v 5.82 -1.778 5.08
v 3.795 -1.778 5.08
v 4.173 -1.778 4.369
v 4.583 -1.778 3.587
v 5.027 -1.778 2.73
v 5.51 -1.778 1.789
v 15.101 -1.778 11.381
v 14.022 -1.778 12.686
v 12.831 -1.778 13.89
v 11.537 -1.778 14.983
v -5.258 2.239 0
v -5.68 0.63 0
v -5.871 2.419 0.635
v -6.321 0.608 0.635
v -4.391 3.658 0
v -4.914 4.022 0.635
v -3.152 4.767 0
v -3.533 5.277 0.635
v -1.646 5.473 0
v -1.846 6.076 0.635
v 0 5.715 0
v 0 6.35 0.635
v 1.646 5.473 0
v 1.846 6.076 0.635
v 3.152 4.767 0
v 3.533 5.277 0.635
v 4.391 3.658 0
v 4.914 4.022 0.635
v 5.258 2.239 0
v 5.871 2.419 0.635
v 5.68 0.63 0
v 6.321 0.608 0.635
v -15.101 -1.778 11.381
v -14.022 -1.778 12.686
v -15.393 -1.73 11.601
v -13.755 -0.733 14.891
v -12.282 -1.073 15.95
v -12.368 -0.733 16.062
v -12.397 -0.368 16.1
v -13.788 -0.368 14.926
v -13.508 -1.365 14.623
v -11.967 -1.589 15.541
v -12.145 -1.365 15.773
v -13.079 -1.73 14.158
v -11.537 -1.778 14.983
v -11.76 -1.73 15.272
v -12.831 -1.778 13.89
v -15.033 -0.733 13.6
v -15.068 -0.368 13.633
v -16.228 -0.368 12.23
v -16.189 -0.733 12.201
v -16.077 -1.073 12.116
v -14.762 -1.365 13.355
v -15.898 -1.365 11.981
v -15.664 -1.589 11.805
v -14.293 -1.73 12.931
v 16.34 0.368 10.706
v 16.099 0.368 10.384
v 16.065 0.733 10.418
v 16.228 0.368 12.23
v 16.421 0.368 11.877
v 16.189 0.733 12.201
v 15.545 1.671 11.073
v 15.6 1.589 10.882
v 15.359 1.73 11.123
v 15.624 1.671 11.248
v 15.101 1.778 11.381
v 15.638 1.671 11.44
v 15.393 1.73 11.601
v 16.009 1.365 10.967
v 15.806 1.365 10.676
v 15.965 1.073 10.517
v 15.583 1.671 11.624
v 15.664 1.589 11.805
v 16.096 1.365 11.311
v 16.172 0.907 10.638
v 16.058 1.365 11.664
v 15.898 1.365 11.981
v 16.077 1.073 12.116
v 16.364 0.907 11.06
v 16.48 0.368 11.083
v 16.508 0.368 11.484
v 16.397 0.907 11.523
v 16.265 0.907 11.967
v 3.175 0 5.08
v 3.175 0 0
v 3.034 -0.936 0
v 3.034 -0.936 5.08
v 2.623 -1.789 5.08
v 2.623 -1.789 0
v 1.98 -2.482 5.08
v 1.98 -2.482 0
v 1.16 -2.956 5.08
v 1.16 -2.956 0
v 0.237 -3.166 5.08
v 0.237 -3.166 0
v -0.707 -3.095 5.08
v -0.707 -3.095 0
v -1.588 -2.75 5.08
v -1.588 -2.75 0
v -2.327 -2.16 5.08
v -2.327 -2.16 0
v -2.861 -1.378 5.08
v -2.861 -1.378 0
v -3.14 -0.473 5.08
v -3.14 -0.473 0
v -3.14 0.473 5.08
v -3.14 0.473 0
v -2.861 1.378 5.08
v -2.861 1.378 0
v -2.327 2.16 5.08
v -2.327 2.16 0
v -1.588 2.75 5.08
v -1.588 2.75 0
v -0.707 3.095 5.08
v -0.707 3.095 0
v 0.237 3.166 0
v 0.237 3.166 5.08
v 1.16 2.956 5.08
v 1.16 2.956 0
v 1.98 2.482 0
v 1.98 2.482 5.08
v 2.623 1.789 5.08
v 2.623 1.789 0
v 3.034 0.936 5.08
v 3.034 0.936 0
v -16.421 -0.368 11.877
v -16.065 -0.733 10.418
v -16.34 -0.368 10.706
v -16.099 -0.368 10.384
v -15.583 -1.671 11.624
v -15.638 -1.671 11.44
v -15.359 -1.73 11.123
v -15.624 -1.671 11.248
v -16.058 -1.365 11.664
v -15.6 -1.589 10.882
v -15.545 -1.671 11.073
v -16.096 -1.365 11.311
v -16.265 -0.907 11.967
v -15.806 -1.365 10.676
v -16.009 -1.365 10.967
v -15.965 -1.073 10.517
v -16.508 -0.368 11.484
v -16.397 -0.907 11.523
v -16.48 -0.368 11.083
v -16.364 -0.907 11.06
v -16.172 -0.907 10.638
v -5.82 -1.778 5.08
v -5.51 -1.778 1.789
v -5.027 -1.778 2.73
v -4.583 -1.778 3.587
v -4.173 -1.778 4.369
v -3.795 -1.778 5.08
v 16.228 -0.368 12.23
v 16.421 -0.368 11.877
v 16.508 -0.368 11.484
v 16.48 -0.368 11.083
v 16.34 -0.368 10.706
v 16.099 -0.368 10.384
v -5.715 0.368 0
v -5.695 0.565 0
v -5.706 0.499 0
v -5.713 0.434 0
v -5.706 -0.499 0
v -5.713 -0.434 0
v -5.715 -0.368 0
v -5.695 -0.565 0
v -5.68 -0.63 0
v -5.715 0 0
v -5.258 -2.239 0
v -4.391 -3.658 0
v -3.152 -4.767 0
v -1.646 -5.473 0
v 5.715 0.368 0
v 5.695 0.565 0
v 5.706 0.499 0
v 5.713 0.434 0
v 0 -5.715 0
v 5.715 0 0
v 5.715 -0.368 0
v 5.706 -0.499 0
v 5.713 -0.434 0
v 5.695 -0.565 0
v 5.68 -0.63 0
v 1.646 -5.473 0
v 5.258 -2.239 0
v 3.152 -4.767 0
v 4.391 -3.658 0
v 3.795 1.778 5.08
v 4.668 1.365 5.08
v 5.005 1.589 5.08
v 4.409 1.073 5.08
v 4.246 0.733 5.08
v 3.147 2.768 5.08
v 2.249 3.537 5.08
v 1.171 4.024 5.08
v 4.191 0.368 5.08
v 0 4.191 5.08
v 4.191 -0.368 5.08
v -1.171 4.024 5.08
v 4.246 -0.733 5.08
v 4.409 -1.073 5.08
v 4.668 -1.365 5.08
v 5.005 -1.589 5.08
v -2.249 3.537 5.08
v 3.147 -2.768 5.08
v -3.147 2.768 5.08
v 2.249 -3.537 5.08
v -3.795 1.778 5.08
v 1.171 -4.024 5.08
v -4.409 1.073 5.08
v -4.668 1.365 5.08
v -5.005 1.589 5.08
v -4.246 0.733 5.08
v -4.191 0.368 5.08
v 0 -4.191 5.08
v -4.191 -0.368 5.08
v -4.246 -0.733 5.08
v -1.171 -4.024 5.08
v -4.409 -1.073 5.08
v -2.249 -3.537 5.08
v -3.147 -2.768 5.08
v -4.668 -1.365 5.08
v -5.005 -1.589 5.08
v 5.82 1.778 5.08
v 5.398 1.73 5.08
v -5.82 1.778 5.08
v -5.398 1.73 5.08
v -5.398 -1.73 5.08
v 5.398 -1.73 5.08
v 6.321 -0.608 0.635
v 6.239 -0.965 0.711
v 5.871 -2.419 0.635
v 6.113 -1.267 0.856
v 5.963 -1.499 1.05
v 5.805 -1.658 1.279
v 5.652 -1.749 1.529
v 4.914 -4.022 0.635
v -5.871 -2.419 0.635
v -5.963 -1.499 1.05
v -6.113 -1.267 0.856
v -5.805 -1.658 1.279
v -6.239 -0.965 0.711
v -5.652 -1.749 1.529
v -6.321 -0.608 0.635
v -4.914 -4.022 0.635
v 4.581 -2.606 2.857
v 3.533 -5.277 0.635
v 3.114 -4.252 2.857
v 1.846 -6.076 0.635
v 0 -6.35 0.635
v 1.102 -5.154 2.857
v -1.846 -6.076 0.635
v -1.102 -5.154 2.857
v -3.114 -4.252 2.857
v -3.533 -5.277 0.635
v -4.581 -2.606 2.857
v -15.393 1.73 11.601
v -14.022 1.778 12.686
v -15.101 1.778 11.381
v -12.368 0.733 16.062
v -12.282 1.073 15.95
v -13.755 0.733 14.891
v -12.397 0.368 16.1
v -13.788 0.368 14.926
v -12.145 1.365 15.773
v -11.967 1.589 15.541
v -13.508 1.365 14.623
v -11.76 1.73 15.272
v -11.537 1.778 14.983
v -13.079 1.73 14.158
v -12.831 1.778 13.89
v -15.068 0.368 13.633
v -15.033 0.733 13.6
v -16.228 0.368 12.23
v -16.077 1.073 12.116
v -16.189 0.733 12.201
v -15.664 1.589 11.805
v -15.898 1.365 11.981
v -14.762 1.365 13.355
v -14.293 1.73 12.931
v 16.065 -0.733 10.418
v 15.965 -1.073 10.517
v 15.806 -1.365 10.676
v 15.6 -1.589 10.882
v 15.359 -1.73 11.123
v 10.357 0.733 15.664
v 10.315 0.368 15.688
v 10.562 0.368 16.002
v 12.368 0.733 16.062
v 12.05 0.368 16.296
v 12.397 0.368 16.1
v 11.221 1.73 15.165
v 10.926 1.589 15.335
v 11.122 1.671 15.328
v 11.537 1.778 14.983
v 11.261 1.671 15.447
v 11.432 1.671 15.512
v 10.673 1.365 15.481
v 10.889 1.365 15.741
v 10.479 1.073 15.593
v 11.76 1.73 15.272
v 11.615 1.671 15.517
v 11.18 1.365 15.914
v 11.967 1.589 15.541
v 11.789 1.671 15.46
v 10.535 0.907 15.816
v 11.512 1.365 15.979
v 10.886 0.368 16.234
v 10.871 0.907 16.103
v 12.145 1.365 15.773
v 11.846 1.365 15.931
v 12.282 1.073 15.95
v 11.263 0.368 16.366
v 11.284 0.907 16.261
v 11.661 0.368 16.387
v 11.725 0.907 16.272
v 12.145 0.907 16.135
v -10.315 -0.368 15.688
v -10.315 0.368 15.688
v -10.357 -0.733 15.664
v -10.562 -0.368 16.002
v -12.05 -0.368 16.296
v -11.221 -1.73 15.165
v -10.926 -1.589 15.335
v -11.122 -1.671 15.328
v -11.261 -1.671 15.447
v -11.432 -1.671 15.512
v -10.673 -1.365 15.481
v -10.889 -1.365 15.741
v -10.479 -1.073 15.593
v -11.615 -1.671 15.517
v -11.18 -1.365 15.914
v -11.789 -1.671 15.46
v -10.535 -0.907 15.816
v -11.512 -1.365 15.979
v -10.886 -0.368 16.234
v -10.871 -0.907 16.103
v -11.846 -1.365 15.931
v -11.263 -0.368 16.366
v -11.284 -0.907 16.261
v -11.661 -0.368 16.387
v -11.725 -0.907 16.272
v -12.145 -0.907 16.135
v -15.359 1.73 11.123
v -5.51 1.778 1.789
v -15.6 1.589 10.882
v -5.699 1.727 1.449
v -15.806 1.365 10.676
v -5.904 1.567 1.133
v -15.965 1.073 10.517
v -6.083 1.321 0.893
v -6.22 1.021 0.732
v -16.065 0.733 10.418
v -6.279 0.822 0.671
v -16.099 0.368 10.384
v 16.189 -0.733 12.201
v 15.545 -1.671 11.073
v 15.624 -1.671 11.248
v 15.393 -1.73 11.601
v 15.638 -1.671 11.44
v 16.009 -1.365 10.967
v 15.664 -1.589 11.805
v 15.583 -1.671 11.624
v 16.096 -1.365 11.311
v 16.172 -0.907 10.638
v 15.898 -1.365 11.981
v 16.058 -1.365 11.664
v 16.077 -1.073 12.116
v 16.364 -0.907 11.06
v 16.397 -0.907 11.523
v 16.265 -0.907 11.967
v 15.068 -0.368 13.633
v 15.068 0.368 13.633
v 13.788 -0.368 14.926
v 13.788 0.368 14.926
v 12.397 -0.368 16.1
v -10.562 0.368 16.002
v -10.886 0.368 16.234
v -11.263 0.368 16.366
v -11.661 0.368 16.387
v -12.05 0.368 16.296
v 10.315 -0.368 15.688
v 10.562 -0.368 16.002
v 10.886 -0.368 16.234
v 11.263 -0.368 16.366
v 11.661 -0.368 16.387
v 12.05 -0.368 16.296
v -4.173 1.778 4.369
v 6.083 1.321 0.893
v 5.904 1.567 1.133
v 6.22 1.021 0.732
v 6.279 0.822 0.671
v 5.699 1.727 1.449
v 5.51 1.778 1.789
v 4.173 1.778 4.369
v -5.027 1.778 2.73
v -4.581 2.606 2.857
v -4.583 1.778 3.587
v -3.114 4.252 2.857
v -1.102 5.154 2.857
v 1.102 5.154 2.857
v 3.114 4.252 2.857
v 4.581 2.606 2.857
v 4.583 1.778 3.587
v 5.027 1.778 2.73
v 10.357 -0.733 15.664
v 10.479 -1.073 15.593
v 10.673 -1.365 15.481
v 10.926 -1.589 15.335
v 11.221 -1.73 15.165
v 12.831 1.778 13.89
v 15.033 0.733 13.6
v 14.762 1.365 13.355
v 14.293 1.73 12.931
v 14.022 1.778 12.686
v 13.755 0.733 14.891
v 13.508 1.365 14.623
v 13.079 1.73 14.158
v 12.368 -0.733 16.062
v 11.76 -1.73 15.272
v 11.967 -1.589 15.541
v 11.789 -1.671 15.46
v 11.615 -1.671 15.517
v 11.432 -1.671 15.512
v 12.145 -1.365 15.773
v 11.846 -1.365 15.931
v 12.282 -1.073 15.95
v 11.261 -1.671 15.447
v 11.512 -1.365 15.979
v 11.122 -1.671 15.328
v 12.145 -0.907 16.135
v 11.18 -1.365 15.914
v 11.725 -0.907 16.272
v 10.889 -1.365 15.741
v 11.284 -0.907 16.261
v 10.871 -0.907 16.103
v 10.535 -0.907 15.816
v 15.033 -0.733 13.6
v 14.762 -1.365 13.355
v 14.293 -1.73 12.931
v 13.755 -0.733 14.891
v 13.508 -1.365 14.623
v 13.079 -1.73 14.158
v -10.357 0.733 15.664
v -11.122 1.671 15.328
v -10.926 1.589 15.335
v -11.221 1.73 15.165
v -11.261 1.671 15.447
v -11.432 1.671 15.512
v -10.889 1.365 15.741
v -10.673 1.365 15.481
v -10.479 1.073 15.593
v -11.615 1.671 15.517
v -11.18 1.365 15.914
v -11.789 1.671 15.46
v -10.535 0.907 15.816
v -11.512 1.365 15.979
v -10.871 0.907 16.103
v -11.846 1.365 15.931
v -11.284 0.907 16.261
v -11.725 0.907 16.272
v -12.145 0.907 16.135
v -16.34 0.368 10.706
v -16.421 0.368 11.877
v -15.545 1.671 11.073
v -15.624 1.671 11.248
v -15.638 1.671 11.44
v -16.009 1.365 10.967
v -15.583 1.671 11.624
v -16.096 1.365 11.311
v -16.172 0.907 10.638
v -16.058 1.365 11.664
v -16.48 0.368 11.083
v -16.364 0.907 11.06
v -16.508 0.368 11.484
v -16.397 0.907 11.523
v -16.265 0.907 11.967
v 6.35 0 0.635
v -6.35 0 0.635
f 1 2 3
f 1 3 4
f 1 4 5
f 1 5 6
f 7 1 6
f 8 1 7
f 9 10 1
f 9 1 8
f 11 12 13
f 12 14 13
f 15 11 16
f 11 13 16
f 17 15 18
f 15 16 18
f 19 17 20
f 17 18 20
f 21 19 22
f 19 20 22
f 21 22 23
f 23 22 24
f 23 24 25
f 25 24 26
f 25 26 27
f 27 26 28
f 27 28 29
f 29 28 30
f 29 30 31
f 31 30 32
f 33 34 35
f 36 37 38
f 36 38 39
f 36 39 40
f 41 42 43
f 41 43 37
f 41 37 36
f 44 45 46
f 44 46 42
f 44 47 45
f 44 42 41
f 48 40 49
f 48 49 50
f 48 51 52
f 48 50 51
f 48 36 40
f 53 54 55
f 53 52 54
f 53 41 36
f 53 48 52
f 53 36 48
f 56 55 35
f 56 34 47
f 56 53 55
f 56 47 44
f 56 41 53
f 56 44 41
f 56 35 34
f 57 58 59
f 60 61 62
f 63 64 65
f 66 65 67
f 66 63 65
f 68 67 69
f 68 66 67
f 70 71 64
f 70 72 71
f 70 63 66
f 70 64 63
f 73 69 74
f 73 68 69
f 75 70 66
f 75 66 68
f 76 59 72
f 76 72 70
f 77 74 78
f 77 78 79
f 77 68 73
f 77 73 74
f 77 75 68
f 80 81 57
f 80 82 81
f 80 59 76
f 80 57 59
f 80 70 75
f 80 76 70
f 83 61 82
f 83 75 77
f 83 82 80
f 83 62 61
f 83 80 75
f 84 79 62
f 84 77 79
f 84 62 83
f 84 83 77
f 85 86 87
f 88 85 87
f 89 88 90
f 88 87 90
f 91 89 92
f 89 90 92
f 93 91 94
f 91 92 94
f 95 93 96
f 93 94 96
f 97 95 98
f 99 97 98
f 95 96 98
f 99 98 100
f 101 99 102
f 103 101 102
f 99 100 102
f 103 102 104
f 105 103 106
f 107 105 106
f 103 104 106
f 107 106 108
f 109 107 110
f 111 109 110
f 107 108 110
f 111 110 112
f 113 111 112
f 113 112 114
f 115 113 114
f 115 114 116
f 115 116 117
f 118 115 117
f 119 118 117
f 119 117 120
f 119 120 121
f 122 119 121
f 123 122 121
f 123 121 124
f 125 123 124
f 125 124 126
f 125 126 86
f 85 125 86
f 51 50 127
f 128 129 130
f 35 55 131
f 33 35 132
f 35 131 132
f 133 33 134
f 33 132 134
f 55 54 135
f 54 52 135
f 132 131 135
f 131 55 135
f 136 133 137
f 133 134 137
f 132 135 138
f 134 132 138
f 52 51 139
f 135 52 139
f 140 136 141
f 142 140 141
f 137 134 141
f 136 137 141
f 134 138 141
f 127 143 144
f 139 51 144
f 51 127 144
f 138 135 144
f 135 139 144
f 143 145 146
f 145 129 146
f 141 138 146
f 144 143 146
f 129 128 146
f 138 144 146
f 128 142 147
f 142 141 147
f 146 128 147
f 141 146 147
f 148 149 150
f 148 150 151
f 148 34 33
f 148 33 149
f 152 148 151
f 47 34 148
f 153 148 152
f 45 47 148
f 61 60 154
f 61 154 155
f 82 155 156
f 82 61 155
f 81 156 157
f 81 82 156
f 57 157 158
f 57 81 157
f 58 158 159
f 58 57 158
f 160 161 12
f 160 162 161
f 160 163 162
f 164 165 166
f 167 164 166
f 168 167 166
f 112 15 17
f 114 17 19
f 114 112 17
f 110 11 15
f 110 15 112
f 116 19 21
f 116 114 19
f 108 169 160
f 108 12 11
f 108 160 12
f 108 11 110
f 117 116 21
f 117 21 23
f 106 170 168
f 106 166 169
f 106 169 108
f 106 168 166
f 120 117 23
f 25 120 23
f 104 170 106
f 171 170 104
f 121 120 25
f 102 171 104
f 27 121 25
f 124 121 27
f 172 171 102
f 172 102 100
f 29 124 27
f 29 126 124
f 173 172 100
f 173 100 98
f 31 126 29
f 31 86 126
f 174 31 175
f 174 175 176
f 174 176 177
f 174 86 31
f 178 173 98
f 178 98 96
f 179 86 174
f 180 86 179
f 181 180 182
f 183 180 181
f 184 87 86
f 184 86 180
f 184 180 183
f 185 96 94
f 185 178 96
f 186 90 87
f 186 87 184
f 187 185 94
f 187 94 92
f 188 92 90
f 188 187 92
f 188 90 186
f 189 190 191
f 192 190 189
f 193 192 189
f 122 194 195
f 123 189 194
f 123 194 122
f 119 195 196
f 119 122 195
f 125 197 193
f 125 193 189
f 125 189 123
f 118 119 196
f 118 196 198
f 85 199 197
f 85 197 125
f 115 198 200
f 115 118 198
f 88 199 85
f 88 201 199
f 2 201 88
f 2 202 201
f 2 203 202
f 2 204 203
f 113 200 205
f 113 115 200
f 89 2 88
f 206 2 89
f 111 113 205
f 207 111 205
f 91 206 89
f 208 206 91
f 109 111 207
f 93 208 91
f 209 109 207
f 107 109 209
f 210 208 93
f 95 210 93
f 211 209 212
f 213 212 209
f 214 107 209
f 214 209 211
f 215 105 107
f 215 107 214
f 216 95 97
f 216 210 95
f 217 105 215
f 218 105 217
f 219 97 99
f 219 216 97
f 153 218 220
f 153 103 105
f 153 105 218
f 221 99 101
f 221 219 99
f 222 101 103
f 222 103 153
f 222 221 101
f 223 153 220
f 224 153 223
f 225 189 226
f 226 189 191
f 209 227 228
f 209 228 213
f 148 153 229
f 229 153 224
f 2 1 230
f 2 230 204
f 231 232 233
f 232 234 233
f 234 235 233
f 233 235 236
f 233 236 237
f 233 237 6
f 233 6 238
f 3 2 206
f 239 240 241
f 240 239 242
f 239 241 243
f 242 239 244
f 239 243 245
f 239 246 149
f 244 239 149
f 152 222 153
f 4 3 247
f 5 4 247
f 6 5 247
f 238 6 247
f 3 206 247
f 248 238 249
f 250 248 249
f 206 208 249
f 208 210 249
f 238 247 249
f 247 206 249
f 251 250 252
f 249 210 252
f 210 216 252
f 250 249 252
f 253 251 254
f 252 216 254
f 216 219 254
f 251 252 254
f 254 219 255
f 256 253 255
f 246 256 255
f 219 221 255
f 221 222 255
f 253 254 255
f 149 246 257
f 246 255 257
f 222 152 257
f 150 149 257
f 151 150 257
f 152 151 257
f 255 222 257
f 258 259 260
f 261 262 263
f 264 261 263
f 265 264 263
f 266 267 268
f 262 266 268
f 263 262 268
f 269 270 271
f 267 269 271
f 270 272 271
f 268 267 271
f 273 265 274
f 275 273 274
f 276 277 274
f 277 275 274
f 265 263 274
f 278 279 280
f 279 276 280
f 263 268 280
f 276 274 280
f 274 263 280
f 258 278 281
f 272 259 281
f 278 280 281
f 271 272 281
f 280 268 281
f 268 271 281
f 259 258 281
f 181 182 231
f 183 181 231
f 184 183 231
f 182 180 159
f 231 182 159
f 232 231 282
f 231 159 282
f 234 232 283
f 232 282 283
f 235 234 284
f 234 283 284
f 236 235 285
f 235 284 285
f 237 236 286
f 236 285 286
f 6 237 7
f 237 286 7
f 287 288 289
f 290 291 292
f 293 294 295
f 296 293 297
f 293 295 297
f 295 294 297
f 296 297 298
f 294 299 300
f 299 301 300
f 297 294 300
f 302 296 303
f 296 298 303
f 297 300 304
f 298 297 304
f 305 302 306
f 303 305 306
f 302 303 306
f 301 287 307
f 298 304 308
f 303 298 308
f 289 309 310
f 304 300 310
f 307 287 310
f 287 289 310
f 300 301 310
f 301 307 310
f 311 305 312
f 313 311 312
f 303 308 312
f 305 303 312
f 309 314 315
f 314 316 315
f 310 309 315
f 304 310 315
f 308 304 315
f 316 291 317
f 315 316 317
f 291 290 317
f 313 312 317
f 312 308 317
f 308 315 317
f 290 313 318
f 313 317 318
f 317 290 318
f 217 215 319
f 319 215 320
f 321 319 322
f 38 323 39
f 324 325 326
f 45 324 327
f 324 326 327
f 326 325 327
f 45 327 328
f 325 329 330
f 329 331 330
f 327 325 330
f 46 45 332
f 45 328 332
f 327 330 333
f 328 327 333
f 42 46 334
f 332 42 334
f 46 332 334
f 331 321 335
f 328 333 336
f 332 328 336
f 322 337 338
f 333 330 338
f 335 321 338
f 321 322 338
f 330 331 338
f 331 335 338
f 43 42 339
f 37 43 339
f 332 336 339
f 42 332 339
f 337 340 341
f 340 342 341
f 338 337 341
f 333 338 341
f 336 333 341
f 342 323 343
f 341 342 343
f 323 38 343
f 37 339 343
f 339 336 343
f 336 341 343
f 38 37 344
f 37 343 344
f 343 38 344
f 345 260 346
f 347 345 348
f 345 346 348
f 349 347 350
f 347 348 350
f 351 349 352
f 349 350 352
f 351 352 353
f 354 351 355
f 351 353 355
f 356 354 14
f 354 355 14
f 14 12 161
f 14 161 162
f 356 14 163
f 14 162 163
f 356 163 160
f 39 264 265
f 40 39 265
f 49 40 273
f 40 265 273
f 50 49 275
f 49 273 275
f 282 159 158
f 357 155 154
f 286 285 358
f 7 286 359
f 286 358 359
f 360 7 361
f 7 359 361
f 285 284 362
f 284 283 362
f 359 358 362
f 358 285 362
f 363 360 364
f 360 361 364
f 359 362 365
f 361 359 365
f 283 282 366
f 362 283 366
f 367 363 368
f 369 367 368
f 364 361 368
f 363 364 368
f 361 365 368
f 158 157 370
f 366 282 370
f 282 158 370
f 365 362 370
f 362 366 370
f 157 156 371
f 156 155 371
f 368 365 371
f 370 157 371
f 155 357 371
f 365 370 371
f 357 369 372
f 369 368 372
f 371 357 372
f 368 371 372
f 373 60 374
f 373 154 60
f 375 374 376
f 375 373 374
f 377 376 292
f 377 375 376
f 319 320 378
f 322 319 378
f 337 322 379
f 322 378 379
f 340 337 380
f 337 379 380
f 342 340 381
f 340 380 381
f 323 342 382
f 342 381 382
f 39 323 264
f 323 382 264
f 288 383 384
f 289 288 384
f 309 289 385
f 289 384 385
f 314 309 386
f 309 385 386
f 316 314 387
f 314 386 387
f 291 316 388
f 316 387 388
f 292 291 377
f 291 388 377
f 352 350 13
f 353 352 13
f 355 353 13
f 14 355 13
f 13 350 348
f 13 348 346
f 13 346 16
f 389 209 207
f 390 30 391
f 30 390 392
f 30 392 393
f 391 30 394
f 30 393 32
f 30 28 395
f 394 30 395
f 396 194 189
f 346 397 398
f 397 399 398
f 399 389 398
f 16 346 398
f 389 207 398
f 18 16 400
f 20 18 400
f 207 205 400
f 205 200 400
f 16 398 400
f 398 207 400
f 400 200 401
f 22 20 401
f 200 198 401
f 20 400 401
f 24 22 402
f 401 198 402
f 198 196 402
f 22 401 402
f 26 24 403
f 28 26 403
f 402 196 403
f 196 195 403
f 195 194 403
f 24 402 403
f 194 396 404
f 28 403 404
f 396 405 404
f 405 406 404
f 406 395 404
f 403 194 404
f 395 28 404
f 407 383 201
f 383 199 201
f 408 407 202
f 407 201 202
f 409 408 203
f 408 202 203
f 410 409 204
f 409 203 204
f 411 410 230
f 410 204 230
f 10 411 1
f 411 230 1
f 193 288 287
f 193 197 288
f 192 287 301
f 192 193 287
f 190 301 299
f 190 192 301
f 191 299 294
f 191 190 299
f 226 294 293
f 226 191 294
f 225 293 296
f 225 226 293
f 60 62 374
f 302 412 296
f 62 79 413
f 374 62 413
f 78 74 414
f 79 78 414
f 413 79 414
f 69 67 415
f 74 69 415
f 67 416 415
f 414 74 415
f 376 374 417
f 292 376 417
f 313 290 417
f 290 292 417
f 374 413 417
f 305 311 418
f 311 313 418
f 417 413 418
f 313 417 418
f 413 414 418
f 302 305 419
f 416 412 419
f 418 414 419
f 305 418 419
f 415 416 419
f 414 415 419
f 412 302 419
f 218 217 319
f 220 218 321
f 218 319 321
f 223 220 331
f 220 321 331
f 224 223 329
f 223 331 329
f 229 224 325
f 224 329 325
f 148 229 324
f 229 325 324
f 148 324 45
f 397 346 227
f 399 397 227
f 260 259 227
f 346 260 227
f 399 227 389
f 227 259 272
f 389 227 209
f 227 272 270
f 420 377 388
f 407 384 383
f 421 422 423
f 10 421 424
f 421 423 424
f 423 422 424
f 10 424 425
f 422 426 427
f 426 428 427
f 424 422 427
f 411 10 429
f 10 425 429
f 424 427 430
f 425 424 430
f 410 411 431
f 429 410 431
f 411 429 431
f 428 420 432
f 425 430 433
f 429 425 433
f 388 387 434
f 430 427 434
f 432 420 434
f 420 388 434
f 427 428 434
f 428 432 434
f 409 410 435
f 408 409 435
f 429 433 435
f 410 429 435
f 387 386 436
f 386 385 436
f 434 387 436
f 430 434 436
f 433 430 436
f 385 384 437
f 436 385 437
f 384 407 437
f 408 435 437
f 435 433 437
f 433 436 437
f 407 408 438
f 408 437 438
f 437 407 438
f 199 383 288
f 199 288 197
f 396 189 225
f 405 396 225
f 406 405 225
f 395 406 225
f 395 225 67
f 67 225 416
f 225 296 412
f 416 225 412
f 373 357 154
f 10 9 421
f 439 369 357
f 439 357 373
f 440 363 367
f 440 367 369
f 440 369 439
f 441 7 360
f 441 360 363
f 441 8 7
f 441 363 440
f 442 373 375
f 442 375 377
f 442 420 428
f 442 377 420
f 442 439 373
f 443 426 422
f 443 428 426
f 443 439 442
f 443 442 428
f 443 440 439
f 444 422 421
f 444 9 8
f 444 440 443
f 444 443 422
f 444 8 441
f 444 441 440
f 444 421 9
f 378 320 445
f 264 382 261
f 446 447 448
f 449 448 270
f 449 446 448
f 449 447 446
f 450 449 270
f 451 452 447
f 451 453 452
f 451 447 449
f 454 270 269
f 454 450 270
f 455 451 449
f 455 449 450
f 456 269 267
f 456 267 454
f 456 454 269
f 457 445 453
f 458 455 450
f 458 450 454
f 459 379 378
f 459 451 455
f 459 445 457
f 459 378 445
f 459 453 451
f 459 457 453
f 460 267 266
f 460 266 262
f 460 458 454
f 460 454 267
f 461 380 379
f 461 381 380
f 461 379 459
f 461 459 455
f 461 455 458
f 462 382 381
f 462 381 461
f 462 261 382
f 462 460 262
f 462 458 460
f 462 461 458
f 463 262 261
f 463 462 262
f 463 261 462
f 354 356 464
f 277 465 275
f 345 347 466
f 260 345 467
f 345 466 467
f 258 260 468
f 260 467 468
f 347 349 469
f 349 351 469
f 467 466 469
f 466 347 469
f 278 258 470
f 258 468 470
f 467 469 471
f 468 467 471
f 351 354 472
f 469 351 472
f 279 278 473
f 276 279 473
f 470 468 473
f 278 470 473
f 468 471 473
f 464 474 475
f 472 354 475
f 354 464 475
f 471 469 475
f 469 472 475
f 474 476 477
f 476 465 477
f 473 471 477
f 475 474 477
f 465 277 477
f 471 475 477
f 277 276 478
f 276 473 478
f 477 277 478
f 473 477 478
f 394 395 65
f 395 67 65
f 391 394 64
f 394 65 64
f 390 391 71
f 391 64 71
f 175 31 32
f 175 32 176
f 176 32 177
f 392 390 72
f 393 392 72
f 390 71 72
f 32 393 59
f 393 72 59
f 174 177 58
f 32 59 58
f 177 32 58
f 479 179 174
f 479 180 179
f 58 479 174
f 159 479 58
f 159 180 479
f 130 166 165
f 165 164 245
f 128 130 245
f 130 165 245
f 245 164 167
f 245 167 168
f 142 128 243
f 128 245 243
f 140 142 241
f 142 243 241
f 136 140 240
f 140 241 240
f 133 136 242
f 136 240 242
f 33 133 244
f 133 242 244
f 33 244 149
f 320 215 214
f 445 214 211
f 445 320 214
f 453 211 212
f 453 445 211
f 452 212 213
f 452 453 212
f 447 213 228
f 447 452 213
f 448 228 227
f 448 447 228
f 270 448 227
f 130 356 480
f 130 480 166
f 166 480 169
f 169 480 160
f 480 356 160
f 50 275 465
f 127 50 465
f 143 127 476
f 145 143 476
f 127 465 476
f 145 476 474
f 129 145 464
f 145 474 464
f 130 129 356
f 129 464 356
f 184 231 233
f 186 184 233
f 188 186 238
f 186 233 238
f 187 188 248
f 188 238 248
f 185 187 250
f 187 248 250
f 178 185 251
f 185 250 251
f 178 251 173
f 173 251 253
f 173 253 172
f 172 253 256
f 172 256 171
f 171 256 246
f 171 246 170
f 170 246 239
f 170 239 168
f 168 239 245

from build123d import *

# Parameters (mm, degrees)
F3_DEPTH = 1.778
F4_R     = 1.4103835631


with BuildPart() as f1:
    # F0 (on Front) → F1 (revolve)
    with BuildSketch(Plane.XZ):
        Polygon((3.175, 5.08), (3.175, 0), (5.715, 0), (6.35, 0.635), (4.191, 5.08), align=None)
    revolve(axis=Axis((0, 0, -0.1242621523), (0, 0, -1)))

    # F2 (on Front) → F3 (join, symmetric)
    with BuildSketch(Plane.XZ):
        with BuildLine():
            Line((-16.9389024071, 11.2239024071), (-6.35, 0.635))
            Line((-6.35, 0.635), (-4.191, 5.08))
            Line((-4.191, 5.08), (-11.088930664, 17.0275663772))
            ThreePointArc((-11.088930664, 17.0275663772), (-14.3112014008, 14.4253913106), (-16.9389024071, 11.2239024071))
        make_face()
        with BuildLine():
            ThreePointArc((16.9389024071, 11.2239024071), (14.3112014008, 14.4253913106), (11.088930664, 17.0275663772))
            Line((11.088930664, 17.0275663772), (4.191, 5.08))
            Line((4.191, 5.08), (6.35, 0.635))
            Line((6.35, 0.635), (16.9389024071, 11.2239024071))
        make_face()
        Polygon((-4.191, 5.08), (-6.35, 0.635), (-5.715, 0), (-3.175, 0), (-3.175, 5.08), align=None)
        Polygon((4.191, 5.08), (3.175, 5.08), (3.175, 0), (5.715, 0), (6.35, 0.635), align=None)
    extrude(amount=F3_DEPTH, both=True)

    # F4 (call 1 of 2: OpenCascade refuses the feature's edges together)
    f4_edges = [f1.edges().sort_by_distance(p)[0] for p in [
        (-7.639965, -1.778, 11.053783),
        (-11.326951, -1.778, 5.611951),
        (-11.326951, 1.778, 5.611951),
        (-7.639965, 1.778, 11.053783),
        (-14.311201, 1.778, 14.425391),
        (-16.938902, 0, 11.223902),
        (-14.311201, -1.778, 14.425391),
        (-11.088931, 0, 17.027566),
    ]]
    fillet(f4_edges, radius=F4_R)

    # F4#2 (call 2 of 2)
    f4_2_edges = [f1.edges().sort_by_distance(p)[0] for p in [
        (11.326951, 1.778, 5.611951),
        (11.326951, -1.778, 5.611951),
        (14.311201, 1.778, 14.425391),
        (11.088931, 0, 17.027566),
        (14.311201, -1.778, 14.425391),
        (16.938902, 0, 11.223902),
        (7.639965, 1.778, 11.053783),
        (7.639965, -1.778, 11.053783),
    ]]
    fillet(f4_2_edges, radius=F4_R)


solid = f1.part
